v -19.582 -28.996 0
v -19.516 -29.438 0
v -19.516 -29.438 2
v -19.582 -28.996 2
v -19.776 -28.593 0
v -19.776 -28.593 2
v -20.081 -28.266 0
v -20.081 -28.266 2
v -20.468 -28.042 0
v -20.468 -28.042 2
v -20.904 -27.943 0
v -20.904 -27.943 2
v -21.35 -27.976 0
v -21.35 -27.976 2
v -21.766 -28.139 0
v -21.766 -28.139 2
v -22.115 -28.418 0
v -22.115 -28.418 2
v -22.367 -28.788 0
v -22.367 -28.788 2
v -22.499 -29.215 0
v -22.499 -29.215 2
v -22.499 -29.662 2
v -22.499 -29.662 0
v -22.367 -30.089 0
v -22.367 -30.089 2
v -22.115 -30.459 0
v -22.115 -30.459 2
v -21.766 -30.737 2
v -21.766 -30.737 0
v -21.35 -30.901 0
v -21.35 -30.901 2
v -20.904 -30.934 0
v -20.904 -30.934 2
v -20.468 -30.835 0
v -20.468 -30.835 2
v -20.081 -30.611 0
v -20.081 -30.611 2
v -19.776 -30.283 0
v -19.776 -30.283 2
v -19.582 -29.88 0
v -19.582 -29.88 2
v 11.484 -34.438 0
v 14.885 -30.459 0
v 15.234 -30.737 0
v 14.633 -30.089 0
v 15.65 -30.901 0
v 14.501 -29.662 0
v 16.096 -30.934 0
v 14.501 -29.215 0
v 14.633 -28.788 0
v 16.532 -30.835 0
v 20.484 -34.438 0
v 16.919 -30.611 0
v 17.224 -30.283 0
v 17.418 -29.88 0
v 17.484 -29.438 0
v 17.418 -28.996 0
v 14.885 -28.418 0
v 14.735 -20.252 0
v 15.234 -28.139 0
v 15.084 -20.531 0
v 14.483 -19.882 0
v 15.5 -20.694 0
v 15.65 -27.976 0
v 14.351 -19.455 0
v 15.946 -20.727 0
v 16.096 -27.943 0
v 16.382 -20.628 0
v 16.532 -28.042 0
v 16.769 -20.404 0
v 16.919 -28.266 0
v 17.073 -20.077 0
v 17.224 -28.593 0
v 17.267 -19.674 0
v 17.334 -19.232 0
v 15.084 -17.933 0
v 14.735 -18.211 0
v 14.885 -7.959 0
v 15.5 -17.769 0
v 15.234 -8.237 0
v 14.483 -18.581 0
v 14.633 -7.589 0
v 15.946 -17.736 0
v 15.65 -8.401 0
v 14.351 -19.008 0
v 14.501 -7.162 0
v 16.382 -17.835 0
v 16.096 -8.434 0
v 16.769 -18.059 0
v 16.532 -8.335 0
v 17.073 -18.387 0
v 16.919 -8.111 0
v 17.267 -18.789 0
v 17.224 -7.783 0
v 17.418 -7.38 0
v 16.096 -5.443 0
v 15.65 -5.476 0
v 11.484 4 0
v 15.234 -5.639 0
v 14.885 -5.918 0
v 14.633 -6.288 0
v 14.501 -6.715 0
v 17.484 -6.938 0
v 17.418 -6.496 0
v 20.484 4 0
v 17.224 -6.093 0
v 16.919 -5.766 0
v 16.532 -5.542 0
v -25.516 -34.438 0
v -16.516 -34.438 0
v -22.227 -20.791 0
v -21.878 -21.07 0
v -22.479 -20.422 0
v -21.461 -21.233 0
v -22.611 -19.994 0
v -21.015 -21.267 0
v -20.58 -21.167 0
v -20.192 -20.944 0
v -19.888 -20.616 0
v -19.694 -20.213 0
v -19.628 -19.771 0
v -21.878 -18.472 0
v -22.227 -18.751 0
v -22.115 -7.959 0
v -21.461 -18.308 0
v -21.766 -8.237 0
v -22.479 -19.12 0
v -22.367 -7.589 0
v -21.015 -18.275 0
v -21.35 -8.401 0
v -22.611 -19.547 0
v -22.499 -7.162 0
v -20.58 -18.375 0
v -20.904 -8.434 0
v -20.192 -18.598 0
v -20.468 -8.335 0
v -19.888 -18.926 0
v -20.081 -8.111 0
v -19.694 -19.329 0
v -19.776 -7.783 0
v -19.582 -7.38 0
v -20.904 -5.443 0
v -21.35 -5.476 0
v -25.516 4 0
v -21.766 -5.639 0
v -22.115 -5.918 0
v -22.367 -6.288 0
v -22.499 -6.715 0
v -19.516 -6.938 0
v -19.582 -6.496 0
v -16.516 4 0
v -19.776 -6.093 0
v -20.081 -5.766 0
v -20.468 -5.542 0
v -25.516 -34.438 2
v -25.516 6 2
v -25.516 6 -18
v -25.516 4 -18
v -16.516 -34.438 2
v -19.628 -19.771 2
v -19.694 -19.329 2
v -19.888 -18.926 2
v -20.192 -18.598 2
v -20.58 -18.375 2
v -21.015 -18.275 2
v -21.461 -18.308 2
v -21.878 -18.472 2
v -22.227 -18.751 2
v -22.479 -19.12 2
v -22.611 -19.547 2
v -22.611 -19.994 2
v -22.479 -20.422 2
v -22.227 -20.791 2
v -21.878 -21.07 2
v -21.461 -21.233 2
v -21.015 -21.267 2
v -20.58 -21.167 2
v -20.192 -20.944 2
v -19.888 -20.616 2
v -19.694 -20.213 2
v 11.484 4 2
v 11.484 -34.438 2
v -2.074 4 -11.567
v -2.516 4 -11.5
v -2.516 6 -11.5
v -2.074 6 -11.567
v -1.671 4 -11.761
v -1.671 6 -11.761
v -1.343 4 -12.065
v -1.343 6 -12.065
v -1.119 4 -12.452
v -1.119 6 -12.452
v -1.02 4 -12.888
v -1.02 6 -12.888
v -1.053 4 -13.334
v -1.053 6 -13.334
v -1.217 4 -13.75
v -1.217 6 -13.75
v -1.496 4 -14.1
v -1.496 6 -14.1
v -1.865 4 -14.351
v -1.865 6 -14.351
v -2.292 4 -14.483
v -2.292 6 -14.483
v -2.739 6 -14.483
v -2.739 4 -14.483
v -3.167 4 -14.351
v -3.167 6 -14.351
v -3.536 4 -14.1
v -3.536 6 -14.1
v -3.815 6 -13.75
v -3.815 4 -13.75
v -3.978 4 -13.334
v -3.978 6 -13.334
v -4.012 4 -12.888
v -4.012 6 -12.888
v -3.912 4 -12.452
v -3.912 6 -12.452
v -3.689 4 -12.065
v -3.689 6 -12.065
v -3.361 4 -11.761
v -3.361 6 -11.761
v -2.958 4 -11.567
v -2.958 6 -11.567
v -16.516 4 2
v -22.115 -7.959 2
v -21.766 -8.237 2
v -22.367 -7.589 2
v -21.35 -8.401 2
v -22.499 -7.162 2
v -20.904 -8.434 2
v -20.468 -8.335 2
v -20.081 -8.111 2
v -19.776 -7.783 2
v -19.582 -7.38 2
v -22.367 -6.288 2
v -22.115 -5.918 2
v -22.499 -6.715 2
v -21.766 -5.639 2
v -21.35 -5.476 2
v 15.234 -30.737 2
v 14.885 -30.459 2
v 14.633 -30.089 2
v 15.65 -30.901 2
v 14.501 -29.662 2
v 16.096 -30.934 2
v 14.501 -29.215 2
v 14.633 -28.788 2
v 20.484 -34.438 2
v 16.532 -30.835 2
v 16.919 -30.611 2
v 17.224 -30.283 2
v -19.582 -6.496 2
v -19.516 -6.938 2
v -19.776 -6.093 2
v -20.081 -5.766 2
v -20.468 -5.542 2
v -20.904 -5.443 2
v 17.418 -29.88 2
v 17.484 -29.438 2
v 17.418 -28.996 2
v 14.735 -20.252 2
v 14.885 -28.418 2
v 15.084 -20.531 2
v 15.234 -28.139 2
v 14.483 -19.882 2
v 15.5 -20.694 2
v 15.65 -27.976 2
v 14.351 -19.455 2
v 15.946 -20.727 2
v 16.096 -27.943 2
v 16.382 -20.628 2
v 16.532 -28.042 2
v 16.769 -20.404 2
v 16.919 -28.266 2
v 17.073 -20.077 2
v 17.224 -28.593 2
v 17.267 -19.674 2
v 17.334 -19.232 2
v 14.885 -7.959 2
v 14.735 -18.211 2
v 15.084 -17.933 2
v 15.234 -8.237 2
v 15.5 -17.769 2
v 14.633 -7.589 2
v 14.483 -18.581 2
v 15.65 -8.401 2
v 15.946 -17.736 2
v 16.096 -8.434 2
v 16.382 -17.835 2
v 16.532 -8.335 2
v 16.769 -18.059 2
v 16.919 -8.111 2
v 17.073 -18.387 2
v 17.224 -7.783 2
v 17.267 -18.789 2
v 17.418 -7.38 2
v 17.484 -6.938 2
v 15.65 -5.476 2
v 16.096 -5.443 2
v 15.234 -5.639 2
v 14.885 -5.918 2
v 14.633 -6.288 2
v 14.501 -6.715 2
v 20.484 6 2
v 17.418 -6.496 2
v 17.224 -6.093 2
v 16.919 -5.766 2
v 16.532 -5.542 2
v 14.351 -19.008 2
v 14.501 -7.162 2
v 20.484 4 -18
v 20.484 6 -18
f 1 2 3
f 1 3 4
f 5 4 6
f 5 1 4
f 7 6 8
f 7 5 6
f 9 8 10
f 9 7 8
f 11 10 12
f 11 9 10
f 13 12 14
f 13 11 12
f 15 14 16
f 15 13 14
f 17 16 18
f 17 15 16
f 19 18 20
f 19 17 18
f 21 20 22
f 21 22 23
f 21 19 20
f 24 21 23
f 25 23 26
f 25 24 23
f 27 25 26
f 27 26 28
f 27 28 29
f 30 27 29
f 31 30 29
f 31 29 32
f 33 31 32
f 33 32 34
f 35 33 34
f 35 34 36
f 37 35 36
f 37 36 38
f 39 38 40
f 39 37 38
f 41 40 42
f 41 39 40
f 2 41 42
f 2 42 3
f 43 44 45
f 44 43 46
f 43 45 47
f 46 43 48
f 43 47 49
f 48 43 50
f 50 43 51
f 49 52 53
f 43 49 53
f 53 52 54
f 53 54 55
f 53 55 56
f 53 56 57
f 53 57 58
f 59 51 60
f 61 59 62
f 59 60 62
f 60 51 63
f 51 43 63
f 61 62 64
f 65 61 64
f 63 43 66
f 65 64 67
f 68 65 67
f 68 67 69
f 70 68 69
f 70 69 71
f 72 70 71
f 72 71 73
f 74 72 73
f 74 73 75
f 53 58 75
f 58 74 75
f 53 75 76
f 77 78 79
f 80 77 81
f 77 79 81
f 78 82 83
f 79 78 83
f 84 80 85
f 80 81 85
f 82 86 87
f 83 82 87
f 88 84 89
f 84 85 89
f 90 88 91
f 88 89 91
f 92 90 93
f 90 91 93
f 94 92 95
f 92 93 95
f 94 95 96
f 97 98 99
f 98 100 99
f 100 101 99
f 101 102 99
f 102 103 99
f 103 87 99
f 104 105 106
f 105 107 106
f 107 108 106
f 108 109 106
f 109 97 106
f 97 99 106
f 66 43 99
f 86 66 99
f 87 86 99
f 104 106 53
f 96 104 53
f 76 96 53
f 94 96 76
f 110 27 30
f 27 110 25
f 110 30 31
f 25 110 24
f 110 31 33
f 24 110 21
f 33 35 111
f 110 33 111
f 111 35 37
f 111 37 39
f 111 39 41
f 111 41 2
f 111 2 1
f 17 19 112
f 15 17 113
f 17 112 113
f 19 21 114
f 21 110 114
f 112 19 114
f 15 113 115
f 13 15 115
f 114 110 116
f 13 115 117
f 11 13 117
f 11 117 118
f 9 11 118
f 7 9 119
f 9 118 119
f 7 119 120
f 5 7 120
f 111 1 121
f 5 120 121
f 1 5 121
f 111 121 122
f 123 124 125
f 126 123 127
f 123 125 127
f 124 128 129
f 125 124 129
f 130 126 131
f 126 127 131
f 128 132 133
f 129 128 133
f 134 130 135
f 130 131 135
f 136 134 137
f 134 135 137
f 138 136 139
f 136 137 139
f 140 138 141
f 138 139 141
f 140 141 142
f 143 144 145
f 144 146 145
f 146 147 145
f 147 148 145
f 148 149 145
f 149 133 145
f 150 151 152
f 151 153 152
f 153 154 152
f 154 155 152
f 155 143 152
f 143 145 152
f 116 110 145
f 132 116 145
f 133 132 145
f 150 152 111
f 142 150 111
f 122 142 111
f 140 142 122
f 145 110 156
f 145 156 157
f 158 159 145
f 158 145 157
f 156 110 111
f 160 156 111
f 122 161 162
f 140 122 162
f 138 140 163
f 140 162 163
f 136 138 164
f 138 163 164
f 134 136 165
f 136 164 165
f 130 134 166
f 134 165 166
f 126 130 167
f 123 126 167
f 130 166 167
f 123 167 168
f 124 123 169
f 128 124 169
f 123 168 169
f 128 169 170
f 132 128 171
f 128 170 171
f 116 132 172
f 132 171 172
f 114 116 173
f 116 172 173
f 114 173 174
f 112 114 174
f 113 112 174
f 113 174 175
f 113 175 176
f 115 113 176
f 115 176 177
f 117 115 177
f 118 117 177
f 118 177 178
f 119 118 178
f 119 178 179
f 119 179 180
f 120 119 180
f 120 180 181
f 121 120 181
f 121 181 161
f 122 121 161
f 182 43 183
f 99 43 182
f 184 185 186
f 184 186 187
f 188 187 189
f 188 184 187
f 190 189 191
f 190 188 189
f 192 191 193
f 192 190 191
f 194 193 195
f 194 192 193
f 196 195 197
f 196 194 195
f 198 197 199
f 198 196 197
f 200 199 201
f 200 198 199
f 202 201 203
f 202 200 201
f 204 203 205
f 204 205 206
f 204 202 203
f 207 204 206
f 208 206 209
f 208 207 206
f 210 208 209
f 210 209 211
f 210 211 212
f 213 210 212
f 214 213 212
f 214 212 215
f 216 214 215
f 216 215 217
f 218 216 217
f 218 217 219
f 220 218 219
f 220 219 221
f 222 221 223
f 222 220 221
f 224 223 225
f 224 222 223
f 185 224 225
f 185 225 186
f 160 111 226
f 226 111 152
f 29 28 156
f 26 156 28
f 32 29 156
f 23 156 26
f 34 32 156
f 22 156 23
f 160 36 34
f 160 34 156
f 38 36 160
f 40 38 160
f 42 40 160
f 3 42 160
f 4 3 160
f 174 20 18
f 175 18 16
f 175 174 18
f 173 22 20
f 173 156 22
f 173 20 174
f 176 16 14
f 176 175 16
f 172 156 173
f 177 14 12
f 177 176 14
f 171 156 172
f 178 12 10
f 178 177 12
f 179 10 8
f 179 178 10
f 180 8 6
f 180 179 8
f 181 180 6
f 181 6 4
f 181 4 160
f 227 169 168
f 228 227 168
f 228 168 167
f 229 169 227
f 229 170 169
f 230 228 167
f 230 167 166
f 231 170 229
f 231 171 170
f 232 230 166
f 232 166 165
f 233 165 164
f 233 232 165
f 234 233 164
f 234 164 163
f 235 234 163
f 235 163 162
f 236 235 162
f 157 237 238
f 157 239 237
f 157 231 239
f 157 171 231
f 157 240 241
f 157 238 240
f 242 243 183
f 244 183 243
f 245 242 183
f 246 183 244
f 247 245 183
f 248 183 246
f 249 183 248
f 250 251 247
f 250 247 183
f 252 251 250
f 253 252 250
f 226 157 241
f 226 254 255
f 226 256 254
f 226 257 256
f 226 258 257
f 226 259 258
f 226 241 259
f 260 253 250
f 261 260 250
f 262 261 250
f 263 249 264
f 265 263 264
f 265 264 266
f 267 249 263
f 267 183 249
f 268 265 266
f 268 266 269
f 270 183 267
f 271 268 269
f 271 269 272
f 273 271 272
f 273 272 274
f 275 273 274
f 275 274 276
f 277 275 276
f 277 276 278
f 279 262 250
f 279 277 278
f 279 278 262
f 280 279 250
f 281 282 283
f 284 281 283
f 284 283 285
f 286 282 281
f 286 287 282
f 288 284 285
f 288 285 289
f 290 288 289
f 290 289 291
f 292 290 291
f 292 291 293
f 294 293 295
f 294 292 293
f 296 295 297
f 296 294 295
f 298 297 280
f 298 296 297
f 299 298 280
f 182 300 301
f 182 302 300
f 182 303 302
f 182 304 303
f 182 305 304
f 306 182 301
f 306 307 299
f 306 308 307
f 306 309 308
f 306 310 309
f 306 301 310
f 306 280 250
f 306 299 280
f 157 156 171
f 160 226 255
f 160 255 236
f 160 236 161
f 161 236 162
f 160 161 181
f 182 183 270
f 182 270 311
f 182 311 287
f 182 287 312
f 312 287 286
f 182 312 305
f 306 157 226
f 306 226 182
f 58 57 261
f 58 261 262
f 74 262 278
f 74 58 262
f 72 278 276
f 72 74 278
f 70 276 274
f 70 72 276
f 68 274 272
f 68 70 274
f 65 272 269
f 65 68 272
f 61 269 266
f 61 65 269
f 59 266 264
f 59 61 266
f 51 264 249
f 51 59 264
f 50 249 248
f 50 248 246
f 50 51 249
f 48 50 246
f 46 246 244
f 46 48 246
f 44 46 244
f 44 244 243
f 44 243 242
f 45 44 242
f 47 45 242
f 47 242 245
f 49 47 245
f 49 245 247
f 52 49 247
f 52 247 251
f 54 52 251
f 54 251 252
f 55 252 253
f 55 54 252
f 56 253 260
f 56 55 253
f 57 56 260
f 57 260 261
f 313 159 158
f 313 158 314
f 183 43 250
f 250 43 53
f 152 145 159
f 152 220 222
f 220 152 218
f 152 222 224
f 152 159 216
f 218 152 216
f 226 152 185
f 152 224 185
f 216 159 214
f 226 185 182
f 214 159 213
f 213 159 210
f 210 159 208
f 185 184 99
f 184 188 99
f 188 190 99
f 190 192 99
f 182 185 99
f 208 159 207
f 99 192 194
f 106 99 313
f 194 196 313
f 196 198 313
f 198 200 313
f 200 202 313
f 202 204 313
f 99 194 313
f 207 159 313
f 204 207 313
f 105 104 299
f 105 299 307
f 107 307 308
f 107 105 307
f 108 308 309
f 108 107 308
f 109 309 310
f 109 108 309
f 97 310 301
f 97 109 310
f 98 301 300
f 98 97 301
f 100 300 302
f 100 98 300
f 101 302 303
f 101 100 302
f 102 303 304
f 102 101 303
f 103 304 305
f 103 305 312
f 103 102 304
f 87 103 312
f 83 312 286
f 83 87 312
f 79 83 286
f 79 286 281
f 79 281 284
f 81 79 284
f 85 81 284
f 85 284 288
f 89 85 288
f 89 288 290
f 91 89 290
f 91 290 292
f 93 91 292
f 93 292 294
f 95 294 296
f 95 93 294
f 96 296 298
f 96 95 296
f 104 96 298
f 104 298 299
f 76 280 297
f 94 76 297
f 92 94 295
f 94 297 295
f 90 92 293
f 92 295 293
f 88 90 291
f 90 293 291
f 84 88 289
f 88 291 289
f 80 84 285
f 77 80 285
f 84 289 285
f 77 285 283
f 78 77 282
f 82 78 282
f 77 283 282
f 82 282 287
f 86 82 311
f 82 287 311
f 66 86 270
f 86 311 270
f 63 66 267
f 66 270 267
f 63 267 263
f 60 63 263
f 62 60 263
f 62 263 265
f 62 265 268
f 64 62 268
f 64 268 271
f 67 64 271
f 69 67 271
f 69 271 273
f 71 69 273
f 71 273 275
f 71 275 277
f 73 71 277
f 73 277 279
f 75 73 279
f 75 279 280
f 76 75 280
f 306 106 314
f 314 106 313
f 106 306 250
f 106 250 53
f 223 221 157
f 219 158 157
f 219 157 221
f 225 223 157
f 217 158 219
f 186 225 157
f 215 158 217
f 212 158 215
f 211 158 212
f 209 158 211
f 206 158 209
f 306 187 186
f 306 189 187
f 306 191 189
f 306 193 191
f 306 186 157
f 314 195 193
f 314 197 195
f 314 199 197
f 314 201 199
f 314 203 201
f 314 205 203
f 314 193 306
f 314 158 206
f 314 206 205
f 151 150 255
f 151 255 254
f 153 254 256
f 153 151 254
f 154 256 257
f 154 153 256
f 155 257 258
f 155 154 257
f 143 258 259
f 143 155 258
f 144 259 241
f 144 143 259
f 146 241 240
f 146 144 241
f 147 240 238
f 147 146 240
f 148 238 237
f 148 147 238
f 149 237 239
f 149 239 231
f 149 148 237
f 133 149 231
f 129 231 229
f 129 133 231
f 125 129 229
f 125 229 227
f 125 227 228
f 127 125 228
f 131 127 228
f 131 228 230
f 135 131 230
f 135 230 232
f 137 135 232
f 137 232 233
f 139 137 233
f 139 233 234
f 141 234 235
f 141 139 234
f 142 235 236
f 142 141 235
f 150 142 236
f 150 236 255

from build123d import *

# Parameters (mm, degrees)
SKETCH3_W             = 9
SKETCH3_H             = 40
SKETCH3_R             = 1.5
BOSS_EXTRUDE5_DEPTH   = 2
BOSS_EXTRUDE5_2_DEPTH = 2
SKETCH5_W             = 46
SKETCH5_H             = 20
SKETCH5_R             = 1.5
BOSS_EXTRUDE7_DEPTH   = 2
SKETCH6_R             = 1.5
CUT_EXTRUDE1_DEPTH    = 10
SKETCH7_R             = 1.5
CUT_EXTRUDE2_DEPTH    = 10


with BuildPart() as part:
    # Sketch3 → Boss-Extrude5 (new body)
    with BuildSketch(Plane.XY):
        with Locations((-21.015808288, -14.438328765)):
            Rectangle(SKETCH3_W, SKETCH3_H)
        with Locations((-21.015808288, -29.438328765)):
            Circle(SKETCH3_R, mode=Mode.SUBTRACT)
        with Locations((-21.015808288, -6.938328765)):
            Circle(SKETCH3_R, mode=Mode.SUBTRACT)
    extrude(amount=BOSS_EXTRUDE5_DEPTH)



with BuildPart() as body_2:
    # Sketch3 → Boss-Extrude5 2 (new body)
    with BuildSketch(Plane.XY):
        with Locations((15.984191712, -14.438328765)):
            Rectangle(SKETCH3_W, SKETCH3_H)
        with Locations((15.984191712, -29.438328765)):
            Circle(SKETCH3_R, mode=Mode.SUBTRACT)
        with Locations((15.984191712, -6.938328765)):
            Circle(SKETCH3_R, mode=Mode.SUBTRACT)
    extrude(amount=BOSS_EXTRUDE5_2_DEPTH)


with BuildPart() as part_1:
    add(part.part)

    add(body_2.part)  # Boss-Extrude7 merges body 2
    # Sketch5 → Boss-Extrude7 (add)
    with BuildSketch(Plane(origin=(0, 4, 0), x_dir=(1, 0, 0), z_dir=(0, 1, 0))):
        with Locations((-2.515808288, 8)):
            Rectangle(SKETCH5_W, SKETCH5_H)
        with Locations(Location((-2.515808288, 13, 0), (0, 0, 270))):
            Circle(SKETCH5_R, mode=Mode.SUBTRACT)
    extrude(amount=BOSS_EXTRUDE7_DEPTH)

    # Sketch6 → Cut-Extrude1 (cut)
    with BuildSketch(Plane.XY.offset(2)):
        with Locations((15.834091702, -19.231630496)):
            Circle(SKETCH6_R)
    extrude(amount=-CUT_EXTRUDE1_DEPTH, mode=Mode.SUBTRACT)

    # Sketch7 → Cut-Extrude2 (cut)
    with BuildSketch(Plane.XY.offset(2)):
        with Locations((-21.127531315, -19.770890517)):
            Circle(SKETCH7_R)
    extrude(amount=-CUT_EXTRUDE2_DEPTH, mode=Mode.SUBTRACT)


solid = part_1.part
